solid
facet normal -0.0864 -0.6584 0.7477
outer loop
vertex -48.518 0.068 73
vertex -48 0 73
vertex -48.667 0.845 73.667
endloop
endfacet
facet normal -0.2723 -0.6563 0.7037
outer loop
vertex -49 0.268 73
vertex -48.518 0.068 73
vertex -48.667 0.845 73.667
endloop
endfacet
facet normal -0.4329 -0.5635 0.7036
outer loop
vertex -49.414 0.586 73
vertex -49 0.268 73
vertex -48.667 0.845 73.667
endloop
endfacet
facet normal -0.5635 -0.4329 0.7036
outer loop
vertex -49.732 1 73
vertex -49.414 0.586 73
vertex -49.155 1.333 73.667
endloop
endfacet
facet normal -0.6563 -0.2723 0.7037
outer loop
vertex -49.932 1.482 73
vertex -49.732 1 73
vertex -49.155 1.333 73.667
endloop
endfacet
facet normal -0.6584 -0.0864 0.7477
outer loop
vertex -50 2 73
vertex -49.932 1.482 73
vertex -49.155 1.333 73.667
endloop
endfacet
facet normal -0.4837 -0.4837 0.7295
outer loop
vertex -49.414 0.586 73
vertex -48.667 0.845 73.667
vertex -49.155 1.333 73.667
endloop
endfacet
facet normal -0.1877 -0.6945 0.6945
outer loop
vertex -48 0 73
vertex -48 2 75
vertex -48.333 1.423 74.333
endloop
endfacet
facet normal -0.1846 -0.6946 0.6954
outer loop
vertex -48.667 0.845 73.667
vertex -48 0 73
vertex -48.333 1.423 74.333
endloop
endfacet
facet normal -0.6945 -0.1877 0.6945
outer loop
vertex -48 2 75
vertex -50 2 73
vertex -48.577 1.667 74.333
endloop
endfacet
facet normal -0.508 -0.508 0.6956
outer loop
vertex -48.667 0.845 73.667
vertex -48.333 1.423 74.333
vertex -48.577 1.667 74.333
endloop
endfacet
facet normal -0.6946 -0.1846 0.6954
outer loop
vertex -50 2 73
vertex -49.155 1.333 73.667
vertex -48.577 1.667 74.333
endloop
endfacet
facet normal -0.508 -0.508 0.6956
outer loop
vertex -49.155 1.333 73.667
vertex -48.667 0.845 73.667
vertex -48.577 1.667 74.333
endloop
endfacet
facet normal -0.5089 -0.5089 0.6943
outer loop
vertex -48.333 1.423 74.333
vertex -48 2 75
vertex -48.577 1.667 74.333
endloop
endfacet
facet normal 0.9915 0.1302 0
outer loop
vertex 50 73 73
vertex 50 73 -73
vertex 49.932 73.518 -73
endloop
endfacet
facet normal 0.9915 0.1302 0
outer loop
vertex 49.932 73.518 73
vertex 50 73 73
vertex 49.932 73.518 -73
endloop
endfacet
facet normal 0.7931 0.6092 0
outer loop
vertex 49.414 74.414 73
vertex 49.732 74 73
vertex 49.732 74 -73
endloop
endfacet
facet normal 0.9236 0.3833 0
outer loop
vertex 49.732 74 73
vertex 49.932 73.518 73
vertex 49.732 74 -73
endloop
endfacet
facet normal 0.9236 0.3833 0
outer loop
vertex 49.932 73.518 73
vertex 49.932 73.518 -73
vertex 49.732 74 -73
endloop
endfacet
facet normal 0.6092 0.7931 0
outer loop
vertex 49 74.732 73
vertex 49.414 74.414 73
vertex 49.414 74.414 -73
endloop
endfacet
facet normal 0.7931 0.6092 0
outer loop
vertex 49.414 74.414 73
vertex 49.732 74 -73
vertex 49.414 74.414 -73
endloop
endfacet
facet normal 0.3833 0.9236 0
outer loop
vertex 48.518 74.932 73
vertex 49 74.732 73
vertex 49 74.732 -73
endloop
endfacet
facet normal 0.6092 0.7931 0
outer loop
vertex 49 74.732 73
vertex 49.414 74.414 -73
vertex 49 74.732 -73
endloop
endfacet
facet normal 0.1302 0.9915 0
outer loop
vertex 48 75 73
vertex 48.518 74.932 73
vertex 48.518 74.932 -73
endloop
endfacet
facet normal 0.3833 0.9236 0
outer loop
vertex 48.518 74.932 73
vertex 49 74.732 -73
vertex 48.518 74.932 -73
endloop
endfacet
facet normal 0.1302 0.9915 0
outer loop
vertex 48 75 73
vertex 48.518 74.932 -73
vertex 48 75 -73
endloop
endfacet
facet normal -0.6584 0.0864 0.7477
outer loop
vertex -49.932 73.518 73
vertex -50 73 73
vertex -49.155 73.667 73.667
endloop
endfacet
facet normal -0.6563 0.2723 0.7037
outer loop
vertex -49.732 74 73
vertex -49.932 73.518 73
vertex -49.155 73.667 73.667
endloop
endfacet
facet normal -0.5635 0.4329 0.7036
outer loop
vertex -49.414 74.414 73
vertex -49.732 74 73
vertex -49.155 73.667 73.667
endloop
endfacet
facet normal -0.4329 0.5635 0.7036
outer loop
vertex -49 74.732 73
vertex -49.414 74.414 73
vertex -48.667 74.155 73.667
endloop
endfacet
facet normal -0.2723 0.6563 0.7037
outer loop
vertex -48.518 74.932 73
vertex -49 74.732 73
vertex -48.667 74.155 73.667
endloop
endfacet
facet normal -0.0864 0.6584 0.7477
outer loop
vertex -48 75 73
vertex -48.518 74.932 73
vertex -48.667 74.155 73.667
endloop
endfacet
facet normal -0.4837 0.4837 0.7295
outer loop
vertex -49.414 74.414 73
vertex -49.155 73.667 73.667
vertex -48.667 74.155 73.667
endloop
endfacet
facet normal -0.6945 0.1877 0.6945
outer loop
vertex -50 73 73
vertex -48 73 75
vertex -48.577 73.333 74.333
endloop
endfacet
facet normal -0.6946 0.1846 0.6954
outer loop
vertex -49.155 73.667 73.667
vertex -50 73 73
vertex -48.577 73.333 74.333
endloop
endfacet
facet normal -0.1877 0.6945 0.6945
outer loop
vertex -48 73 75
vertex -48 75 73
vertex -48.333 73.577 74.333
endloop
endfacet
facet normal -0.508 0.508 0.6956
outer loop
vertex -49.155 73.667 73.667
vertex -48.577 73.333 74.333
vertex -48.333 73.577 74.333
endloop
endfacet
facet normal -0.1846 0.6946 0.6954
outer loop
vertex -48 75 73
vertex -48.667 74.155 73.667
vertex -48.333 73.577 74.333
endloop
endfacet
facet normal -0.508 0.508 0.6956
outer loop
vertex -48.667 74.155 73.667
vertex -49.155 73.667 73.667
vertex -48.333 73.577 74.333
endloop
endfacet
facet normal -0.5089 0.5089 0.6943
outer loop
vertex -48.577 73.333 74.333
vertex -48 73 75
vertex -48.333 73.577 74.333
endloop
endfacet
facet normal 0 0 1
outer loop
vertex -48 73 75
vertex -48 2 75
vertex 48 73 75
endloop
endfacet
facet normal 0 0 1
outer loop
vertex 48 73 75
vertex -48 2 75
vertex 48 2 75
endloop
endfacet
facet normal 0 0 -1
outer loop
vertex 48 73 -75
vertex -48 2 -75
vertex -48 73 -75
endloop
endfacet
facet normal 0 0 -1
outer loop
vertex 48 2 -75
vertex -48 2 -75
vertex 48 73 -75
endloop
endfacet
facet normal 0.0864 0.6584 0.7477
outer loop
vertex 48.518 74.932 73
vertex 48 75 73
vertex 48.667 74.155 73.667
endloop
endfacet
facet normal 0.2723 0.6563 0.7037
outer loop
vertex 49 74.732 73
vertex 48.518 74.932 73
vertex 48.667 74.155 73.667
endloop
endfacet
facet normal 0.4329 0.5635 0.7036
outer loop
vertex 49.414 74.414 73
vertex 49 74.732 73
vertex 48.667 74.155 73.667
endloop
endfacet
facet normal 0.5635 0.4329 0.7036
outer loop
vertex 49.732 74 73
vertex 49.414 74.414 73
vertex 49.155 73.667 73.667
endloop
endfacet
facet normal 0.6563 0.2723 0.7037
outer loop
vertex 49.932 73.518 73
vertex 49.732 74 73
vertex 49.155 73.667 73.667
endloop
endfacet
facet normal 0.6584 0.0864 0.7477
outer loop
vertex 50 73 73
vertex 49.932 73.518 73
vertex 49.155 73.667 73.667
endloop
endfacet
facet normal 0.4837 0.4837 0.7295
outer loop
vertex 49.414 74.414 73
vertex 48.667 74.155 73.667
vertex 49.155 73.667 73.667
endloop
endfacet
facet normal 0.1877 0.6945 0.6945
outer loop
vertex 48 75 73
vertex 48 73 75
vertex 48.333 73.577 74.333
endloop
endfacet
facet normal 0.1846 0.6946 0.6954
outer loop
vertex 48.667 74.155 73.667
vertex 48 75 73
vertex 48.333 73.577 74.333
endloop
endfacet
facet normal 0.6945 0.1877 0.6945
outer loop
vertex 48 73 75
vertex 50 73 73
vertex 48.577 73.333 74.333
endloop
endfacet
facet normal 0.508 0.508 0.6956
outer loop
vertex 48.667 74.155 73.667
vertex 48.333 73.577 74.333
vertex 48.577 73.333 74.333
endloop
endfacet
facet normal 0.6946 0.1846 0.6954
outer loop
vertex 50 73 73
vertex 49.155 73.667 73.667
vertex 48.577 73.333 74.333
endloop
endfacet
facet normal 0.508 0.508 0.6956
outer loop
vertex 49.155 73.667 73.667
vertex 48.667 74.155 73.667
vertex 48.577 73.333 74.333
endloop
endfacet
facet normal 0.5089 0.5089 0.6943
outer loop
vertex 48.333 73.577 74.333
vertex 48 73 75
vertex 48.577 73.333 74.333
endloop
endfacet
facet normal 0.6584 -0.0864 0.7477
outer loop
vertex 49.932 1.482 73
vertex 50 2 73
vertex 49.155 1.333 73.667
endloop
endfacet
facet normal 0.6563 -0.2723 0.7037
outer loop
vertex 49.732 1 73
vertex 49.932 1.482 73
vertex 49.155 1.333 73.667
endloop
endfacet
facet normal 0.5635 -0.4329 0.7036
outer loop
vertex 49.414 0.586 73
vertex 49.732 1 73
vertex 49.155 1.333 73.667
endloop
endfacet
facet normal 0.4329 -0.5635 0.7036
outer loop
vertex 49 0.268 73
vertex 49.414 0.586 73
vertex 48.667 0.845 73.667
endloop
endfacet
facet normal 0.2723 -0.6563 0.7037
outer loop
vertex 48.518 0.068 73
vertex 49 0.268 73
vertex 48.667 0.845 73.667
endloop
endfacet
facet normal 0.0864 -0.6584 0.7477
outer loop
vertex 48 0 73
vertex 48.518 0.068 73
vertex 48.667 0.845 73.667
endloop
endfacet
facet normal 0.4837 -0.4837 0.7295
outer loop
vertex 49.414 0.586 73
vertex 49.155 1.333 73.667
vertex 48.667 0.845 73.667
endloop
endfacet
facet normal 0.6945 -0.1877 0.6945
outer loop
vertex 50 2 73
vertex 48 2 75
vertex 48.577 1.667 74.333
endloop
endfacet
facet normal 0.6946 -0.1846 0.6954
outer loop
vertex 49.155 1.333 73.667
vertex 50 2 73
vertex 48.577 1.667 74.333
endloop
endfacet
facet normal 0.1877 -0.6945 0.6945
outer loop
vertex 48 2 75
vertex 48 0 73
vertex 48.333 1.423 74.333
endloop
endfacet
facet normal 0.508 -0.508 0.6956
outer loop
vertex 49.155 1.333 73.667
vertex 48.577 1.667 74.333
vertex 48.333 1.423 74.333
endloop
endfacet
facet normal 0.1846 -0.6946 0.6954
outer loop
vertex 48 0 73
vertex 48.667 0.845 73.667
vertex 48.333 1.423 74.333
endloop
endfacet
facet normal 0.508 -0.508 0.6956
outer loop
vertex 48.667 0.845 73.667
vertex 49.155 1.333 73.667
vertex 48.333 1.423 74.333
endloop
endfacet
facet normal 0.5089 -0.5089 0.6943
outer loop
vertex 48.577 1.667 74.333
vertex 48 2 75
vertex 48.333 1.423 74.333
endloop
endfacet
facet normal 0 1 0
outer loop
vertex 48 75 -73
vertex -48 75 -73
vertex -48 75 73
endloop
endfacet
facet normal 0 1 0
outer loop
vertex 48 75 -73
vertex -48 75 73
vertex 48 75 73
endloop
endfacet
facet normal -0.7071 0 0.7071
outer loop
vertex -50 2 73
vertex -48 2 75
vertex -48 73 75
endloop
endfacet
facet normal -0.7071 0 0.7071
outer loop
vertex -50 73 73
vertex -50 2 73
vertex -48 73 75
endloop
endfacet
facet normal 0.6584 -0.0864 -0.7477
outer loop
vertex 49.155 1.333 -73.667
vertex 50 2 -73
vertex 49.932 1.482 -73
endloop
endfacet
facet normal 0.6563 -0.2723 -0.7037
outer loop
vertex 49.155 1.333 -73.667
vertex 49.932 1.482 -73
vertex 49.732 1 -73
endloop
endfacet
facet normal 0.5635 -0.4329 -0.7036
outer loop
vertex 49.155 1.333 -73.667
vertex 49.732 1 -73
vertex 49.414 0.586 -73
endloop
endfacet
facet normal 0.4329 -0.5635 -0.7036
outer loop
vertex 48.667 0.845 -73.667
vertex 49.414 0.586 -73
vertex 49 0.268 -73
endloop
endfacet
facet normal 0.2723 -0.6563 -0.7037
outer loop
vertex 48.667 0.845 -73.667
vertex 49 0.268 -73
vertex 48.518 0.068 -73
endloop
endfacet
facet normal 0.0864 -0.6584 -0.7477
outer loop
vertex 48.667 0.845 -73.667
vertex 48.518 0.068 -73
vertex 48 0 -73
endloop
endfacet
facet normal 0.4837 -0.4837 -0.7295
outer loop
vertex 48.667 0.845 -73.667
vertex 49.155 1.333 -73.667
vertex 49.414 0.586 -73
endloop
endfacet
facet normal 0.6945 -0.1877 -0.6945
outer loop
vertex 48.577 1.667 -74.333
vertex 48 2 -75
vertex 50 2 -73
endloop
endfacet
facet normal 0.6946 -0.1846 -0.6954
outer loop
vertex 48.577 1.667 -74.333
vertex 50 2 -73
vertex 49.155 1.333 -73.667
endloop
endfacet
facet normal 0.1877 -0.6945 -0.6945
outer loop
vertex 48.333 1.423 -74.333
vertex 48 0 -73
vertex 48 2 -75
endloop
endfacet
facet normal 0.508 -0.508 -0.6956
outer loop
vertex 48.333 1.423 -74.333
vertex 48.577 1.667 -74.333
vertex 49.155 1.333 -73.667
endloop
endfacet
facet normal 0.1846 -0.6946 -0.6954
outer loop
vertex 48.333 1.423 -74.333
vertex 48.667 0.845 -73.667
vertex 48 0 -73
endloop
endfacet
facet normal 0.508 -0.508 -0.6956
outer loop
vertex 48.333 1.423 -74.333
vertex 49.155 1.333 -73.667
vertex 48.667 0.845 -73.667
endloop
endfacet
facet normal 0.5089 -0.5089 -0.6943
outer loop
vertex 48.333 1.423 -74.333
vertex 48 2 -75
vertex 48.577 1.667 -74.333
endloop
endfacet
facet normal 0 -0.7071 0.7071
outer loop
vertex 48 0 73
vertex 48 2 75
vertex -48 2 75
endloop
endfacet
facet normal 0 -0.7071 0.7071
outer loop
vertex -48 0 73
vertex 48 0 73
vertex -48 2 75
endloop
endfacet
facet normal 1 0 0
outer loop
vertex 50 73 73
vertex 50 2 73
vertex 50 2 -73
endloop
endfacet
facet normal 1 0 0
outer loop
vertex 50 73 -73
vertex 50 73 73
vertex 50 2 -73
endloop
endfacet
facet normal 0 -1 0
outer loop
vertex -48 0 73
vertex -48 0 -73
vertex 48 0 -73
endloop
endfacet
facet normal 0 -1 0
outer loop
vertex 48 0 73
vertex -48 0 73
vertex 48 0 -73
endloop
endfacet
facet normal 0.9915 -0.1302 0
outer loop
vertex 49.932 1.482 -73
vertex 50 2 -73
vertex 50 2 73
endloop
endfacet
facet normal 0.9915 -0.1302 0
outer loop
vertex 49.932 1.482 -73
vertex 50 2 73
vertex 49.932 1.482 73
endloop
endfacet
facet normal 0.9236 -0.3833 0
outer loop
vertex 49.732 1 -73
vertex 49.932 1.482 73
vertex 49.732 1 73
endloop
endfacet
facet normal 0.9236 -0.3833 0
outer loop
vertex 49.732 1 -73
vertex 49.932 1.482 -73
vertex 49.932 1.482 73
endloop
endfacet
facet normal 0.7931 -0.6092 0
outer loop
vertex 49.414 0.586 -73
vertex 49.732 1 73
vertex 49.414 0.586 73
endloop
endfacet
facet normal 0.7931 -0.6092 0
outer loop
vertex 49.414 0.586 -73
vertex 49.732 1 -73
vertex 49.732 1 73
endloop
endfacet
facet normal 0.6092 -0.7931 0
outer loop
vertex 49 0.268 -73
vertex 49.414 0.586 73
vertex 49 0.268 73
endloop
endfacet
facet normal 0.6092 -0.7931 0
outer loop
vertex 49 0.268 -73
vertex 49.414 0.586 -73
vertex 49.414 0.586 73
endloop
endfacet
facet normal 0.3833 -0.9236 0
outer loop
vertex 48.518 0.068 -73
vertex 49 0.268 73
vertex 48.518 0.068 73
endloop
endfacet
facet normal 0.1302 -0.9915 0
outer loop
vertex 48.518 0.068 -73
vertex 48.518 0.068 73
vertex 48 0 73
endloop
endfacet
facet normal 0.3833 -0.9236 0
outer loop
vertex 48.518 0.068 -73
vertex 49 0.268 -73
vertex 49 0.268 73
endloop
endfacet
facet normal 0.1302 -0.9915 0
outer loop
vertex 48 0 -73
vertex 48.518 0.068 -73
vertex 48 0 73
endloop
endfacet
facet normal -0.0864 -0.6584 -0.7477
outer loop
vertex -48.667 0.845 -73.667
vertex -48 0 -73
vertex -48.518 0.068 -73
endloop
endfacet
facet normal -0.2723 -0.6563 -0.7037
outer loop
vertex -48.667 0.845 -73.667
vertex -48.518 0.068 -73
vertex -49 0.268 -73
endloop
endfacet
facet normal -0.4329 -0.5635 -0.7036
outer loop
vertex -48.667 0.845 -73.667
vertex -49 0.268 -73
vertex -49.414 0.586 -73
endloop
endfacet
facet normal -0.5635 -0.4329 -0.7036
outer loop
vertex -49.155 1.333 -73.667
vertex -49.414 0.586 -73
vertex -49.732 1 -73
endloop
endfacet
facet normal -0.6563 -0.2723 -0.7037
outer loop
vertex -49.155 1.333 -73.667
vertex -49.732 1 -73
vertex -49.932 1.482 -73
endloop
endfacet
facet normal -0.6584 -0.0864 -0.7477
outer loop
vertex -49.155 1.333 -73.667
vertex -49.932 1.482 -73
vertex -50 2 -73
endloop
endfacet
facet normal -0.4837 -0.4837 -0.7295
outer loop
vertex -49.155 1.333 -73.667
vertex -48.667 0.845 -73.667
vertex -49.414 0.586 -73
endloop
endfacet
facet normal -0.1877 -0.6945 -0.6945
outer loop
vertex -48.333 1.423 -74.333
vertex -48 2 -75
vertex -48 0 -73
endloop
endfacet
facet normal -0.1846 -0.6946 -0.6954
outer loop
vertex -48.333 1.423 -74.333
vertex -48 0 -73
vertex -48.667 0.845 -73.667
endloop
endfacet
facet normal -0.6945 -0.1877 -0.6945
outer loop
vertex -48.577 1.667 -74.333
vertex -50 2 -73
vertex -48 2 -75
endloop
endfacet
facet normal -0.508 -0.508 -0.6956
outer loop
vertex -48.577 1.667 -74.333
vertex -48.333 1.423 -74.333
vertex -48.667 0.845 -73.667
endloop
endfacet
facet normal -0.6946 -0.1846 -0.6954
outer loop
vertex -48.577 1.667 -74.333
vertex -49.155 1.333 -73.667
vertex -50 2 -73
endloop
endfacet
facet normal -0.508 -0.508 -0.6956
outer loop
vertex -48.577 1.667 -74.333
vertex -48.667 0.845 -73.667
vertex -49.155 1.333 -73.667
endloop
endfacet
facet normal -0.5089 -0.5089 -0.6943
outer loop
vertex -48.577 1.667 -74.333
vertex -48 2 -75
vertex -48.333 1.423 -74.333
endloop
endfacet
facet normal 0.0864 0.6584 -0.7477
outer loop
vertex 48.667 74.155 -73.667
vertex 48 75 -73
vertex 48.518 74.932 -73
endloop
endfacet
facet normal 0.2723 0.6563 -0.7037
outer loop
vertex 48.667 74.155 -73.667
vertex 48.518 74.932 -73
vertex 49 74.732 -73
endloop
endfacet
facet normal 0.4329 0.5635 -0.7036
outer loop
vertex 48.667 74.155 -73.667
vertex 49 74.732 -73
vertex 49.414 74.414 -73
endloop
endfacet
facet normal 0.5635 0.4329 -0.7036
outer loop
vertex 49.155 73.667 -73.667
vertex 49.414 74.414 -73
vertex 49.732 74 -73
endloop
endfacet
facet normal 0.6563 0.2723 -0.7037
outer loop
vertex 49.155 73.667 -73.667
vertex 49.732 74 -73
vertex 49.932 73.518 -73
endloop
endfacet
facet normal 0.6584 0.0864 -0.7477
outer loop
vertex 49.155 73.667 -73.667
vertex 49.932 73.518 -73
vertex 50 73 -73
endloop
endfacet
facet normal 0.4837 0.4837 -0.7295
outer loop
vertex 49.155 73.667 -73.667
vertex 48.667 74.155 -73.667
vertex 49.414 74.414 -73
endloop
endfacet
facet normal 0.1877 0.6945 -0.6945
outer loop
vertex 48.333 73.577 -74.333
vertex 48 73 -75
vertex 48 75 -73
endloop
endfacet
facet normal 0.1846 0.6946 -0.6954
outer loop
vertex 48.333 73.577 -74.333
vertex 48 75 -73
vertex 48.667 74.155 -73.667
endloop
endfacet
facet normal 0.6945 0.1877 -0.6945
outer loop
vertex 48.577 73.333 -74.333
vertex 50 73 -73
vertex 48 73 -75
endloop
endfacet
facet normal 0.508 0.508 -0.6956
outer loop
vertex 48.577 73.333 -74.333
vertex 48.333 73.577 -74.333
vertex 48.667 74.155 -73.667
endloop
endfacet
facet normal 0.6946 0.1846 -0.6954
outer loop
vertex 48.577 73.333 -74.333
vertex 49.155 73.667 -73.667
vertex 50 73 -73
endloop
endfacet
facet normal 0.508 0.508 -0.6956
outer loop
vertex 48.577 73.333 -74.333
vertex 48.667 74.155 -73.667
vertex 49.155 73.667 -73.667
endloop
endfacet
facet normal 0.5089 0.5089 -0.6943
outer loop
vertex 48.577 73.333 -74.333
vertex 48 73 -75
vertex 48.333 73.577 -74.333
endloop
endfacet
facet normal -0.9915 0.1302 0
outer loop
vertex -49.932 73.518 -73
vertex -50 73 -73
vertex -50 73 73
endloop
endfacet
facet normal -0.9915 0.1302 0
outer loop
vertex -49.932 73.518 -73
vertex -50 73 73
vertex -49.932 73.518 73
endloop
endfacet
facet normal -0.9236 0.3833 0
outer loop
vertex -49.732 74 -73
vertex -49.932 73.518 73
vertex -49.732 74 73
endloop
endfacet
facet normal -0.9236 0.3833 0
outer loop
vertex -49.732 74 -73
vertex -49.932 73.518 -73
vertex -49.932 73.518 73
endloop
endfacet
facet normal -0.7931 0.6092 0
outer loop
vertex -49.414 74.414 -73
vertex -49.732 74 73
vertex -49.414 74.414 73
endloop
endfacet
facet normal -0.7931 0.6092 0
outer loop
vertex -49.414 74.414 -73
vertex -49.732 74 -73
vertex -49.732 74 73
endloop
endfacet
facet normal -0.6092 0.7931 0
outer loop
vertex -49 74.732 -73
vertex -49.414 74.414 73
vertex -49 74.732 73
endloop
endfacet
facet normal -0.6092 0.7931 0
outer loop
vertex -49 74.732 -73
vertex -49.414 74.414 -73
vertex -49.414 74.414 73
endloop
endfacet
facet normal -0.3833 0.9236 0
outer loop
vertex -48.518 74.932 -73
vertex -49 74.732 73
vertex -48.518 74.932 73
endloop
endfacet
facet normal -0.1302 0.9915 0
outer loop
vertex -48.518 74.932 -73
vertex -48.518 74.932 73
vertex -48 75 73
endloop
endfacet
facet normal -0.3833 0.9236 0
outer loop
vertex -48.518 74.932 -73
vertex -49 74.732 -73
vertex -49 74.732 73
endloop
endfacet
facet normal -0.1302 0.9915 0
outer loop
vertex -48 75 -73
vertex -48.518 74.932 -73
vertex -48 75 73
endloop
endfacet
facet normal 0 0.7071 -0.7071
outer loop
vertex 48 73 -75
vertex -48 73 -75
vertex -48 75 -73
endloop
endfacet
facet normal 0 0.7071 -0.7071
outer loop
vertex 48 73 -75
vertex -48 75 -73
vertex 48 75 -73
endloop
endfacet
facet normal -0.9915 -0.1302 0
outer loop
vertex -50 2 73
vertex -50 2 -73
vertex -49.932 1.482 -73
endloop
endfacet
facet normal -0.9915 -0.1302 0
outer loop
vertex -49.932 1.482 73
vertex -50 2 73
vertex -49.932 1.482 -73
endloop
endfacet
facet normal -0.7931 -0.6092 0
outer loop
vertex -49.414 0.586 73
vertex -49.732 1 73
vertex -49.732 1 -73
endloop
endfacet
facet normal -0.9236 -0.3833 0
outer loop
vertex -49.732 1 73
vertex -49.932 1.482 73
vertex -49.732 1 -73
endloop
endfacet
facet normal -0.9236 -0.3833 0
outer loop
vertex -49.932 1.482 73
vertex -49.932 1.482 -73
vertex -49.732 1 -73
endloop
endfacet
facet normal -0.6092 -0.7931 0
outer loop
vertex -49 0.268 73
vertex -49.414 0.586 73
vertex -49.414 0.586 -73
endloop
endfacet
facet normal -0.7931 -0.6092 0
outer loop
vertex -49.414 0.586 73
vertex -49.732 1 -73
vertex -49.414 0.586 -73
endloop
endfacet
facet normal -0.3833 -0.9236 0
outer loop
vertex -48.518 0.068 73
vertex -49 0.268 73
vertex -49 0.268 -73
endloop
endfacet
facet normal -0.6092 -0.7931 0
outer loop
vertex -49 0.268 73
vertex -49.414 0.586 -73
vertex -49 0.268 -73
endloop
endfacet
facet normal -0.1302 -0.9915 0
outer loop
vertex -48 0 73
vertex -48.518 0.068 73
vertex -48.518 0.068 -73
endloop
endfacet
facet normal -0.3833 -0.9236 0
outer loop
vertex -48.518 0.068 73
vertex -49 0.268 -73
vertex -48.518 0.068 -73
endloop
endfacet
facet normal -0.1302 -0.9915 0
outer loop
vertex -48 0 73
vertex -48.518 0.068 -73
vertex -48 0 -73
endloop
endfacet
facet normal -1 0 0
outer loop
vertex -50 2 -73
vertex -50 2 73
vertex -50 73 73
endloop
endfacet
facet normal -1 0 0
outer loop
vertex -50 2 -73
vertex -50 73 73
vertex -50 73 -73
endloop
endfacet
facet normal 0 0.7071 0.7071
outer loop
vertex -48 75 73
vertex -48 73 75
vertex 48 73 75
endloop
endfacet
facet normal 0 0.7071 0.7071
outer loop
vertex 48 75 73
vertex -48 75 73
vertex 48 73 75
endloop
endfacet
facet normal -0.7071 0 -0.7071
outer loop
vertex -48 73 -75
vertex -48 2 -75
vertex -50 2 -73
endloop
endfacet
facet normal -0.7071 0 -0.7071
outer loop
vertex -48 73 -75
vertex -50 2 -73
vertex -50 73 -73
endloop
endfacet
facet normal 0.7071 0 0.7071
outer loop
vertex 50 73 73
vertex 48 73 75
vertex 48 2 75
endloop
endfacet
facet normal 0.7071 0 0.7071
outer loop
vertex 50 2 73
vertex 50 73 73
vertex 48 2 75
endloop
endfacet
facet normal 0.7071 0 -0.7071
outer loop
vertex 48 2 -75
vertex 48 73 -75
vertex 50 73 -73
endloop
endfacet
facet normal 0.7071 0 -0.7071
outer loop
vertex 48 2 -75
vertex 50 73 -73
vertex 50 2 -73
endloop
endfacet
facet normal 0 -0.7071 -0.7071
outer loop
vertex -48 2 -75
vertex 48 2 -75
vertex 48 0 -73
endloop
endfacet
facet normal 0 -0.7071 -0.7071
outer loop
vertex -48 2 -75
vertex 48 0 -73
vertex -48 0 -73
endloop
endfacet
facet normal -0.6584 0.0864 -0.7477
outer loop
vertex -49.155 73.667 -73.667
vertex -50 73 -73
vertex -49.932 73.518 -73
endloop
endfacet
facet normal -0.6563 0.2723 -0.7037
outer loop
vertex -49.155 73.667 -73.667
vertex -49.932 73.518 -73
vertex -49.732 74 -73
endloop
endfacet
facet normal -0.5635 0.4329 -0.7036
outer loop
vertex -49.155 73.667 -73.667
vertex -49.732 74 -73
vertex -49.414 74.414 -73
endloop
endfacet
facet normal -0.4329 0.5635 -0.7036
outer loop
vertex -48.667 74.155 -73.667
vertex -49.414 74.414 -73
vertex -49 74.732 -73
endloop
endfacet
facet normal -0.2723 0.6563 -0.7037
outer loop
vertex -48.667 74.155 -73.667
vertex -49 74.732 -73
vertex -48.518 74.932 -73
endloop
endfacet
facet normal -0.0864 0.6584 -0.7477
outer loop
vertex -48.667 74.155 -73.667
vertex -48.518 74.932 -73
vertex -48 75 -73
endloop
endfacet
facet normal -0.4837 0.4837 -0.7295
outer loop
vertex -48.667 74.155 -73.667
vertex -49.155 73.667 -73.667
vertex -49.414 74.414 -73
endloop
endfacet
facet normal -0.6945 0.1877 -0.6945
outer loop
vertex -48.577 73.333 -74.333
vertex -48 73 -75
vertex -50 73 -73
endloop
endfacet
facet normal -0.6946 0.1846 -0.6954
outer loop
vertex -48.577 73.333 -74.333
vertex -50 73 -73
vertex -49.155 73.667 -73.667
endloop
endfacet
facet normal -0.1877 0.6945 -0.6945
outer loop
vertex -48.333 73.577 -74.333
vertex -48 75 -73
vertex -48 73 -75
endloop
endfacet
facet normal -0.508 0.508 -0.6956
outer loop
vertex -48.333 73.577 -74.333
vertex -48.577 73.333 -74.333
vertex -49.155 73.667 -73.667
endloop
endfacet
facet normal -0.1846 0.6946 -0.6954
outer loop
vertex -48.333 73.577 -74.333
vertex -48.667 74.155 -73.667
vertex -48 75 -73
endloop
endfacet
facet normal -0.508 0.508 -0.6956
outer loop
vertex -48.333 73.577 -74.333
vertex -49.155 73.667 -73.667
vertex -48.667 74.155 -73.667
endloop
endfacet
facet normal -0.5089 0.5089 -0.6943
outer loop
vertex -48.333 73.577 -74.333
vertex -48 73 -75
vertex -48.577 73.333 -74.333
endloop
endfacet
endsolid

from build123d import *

# Parameters (mm, degrees)
SKETCH1_W           = 100
SKETCH1_H           = 150
BOSS_EXTRUDE1_DEPTH = 75
FILLET1_R           = 2
CHAMFER1_SIZE       = 2


with BuildPart() as part:
    # Sketch1 → Boss-Extrude1 (new body)
    with BuildSketch(Plane(origin=(0, 0, 0), x_dir=(1, 0, 0), z_dir=(0, 1, 0))):
        Rectangle(SKETCH1_W, SKETCH1_H)
    extrude(amount=BOSS_EXTRUDE1_DEPTH)

    # Fillet1
    fillet1_edges = [part.edges().sort_by_distance(p)[0] for p in [
        (-50, 75, 0),
        (50, 75, 0),
        (-50, 0, 0),
        (50, 0, 0),
    ]]
    fillet(fillet1_edges, radius=FILLET1_R)

    # Chamfer1
    chamfer1_edges = [part.edges().sort_by_distance(p)[0] for p in [
        (-50, 37.5, 75),
        (-50, 37.5, -75),
        (0, 0, 75),
        (50, 37.5, 75),
        (0, 75, 75),
        (49.414213562, 74.414213562, 75),
        (-49.414213562, 74.414213562, 75),
        (49.414213562, 0.585786438, 75),
        (-49.414213562, 0.585786438, 75),
        (0, 0, -75),
        (0, 75, -75),
        (50, 37.5, -75),
        (49.414213562, 74.414213562, -75),
        (-49.414213562, 74.414213562, -75),
        (49.414213562, 0.585786438, -75),
        (-49.414213562, 0.585786438, -75),
    ]]
    chamfer(chamfer1_edges, length=CHAMFER1_SIZE - 0.0001)  # a hair under: the kernel refuses the full size


solid = part.part
